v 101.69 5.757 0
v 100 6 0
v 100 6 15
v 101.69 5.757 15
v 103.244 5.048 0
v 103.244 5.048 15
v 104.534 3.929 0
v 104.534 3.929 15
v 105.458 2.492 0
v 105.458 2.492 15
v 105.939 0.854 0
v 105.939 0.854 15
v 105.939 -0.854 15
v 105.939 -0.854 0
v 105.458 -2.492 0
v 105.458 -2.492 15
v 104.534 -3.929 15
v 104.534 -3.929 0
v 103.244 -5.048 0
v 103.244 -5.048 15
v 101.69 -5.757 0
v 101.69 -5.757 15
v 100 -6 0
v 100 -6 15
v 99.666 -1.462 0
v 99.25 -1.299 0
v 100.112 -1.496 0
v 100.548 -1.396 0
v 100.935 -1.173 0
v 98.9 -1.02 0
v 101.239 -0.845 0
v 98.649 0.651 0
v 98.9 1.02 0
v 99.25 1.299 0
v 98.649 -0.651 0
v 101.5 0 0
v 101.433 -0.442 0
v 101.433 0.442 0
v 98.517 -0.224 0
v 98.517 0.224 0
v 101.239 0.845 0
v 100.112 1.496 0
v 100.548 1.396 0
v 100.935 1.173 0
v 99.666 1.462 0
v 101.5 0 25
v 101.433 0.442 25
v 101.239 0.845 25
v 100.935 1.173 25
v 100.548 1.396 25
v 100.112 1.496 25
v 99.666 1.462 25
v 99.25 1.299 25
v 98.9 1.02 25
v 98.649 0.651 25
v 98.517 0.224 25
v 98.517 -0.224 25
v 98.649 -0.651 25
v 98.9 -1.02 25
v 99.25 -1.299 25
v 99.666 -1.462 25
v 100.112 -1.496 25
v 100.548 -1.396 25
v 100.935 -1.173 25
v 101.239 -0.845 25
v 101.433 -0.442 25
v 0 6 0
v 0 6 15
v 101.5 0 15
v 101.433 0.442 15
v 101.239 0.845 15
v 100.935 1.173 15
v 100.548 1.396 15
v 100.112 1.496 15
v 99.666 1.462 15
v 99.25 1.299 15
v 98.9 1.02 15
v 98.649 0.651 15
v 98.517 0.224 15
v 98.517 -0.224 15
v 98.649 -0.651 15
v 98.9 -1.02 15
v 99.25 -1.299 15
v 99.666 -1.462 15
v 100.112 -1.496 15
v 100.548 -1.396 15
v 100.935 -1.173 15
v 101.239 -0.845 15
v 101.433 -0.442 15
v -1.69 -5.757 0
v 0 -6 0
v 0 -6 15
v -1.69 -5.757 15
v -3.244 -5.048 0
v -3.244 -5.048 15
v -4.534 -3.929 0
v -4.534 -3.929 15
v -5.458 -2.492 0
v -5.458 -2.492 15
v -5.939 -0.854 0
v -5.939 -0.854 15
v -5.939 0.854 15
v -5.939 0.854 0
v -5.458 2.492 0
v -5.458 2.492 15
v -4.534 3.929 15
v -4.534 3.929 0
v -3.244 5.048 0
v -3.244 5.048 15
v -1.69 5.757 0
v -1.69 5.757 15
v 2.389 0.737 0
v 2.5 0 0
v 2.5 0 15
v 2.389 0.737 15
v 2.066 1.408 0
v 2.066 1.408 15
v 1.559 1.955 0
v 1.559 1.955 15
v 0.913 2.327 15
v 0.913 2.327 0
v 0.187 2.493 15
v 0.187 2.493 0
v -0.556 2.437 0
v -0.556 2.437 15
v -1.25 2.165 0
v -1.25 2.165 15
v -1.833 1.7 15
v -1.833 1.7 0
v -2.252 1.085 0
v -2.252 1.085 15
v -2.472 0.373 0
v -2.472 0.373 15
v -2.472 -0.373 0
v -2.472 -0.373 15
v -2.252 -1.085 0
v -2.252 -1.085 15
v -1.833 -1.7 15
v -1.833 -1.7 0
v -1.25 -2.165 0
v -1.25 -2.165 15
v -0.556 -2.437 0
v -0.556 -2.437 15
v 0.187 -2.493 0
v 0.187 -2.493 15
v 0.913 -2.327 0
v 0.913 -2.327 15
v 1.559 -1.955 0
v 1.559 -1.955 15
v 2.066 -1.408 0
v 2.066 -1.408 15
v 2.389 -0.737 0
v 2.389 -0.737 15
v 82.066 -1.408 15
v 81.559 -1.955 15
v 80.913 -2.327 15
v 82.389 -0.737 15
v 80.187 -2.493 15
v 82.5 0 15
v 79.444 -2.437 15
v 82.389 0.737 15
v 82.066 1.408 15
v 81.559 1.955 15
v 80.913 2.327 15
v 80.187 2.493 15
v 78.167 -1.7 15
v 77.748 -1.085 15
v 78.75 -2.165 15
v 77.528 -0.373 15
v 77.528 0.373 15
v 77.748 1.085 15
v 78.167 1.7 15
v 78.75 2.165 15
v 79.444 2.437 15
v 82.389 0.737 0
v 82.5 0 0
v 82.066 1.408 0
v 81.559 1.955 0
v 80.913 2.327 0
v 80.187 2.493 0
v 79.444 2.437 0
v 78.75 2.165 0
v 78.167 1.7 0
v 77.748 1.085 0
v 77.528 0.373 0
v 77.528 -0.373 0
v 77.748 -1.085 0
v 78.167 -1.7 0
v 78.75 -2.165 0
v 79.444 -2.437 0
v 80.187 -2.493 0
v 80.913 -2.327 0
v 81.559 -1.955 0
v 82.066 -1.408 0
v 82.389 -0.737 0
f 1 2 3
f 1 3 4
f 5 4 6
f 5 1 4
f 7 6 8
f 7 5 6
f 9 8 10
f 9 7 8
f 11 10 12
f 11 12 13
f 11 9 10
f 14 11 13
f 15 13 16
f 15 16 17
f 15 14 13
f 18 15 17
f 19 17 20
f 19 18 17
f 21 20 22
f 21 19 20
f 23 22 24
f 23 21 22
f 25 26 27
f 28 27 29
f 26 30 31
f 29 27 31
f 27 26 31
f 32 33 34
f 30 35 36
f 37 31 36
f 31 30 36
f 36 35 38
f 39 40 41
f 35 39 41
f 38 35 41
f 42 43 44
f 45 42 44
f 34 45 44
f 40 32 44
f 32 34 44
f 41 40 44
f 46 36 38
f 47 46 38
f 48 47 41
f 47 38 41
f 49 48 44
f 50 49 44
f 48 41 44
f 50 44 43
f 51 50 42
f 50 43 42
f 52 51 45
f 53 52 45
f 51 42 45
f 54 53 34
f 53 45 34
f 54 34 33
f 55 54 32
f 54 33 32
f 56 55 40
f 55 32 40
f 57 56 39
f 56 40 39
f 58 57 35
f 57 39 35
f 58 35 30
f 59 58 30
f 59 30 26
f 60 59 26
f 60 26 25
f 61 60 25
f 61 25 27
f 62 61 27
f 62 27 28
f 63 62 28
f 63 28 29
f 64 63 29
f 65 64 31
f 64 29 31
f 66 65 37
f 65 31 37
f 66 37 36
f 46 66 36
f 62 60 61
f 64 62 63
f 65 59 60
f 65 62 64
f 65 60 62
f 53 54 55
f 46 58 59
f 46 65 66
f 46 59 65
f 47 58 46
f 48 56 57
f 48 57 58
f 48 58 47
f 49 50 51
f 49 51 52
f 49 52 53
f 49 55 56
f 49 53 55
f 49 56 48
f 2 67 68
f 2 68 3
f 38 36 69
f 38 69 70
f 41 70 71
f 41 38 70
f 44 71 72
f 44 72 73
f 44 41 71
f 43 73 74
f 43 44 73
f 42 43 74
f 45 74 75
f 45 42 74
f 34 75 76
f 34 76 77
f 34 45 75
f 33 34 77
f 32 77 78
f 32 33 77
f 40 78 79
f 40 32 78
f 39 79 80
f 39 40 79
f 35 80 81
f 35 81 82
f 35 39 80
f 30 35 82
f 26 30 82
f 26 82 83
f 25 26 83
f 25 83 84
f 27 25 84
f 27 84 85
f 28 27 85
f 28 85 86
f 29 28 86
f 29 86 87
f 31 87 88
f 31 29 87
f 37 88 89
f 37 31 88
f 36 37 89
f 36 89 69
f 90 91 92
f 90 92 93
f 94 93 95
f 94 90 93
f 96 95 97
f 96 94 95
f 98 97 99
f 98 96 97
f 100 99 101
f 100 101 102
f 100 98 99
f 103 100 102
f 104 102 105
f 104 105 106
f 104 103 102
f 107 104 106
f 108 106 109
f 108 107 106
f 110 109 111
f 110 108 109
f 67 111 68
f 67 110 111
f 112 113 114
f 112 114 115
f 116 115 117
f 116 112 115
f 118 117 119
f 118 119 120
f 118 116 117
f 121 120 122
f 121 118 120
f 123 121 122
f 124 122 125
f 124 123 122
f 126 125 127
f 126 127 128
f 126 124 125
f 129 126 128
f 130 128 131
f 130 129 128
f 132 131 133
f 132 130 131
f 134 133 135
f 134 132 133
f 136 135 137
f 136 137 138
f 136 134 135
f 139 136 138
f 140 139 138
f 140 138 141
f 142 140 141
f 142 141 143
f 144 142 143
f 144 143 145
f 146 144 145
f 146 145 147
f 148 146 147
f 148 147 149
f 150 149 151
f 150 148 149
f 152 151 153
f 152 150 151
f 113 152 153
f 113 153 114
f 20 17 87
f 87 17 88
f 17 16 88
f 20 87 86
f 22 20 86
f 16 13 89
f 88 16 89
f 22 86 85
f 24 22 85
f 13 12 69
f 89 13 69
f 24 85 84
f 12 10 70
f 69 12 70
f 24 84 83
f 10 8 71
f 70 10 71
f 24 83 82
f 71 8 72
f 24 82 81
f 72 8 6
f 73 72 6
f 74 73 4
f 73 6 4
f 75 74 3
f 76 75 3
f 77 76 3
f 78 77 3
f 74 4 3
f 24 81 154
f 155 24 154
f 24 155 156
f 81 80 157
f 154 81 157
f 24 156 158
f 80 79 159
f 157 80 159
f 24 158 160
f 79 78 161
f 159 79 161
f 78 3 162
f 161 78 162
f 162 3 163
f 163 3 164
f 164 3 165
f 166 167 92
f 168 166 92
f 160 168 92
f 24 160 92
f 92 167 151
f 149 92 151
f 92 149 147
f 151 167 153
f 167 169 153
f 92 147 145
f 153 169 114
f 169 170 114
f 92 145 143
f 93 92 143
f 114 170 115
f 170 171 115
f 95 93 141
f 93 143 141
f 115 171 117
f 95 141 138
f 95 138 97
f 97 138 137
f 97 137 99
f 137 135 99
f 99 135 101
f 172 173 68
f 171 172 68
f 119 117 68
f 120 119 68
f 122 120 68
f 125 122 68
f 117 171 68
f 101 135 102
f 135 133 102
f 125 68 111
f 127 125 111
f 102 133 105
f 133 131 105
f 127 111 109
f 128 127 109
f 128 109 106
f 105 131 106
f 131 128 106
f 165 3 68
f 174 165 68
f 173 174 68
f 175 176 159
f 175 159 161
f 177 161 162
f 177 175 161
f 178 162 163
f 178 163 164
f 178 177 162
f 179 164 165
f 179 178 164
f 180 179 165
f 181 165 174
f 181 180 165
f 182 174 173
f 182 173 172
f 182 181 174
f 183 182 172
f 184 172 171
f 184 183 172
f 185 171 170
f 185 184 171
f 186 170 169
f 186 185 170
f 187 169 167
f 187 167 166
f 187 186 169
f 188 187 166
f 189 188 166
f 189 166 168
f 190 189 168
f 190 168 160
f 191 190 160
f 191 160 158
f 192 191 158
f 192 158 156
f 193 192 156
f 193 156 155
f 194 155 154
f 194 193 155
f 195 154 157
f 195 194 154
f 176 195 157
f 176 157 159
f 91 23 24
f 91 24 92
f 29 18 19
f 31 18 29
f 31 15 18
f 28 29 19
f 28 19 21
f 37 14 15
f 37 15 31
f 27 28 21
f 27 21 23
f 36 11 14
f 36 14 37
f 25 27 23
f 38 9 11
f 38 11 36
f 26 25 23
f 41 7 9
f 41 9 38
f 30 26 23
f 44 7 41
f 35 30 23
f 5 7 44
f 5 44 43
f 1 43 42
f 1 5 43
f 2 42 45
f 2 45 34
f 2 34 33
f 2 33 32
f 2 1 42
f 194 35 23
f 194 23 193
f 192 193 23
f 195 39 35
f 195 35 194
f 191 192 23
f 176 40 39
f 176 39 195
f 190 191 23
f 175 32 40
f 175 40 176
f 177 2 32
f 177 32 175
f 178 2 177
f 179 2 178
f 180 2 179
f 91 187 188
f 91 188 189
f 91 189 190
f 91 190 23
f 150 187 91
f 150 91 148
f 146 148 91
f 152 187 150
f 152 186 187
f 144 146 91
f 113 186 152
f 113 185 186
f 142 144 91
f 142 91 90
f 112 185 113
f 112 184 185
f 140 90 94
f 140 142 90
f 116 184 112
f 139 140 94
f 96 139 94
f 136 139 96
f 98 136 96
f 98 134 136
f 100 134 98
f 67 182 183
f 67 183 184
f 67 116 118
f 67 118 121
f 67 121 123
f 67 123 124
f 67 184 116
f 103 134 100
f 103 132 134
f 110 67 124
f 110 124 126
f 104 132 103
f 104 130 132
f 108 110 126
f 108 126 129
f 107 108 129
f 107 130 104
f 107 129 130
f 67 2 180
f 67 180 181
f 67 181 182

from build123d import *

# Parameters (mm, degrees)
CROQUIS1_R              = 2.5
CROQUIS1_R_2            = 1.5
SALIENTE_EXTRUIR2_DEPTH = 15
CROQUIS1_2_R            = 1.5
SALIENTE_EXTRUIR3_DEPTH = 25


with BuildPart() as part:
    # Croquis1 → Saliente-Extruir2 (new body)
    with BuildSketch(Plane.XY):
        with BuildLine():
            Line((0, 6), (100, 6))
            ThreePointArc((100, 6), (106, 0), (100, -6))
            Line((100, -6), (0, -6))
            ThreePointArc((0, -6), (-6, 0), (0, 6))
        make_face()
        Circle(CROQUIS1_R, mode=Mode.SUBTRACT)
        with Locations((80, 0)):
            Circle(CROQUIS1_R, mode=Mode.SUBTRACT)
        with Locations((100, 0)):
            Circle(CROQUIS1_R_2, mode=Mode.SUBTRACT)
    extrude(amount=SALIENTE_EXTRUIR2_DEPTH)


with BuildPart() as body_2:
    # Croquis1<2> → Saliente-Extruir3 (new body)
    with BuildSketch(Plane.XY):
        with Locations((100, 0)):
            Circle(CROQUIS1_2_R)
    extrude(amount=SALIENTE_EXTRUIR3_DEPTH)


solid = Compound([part.part, body_2.part])
